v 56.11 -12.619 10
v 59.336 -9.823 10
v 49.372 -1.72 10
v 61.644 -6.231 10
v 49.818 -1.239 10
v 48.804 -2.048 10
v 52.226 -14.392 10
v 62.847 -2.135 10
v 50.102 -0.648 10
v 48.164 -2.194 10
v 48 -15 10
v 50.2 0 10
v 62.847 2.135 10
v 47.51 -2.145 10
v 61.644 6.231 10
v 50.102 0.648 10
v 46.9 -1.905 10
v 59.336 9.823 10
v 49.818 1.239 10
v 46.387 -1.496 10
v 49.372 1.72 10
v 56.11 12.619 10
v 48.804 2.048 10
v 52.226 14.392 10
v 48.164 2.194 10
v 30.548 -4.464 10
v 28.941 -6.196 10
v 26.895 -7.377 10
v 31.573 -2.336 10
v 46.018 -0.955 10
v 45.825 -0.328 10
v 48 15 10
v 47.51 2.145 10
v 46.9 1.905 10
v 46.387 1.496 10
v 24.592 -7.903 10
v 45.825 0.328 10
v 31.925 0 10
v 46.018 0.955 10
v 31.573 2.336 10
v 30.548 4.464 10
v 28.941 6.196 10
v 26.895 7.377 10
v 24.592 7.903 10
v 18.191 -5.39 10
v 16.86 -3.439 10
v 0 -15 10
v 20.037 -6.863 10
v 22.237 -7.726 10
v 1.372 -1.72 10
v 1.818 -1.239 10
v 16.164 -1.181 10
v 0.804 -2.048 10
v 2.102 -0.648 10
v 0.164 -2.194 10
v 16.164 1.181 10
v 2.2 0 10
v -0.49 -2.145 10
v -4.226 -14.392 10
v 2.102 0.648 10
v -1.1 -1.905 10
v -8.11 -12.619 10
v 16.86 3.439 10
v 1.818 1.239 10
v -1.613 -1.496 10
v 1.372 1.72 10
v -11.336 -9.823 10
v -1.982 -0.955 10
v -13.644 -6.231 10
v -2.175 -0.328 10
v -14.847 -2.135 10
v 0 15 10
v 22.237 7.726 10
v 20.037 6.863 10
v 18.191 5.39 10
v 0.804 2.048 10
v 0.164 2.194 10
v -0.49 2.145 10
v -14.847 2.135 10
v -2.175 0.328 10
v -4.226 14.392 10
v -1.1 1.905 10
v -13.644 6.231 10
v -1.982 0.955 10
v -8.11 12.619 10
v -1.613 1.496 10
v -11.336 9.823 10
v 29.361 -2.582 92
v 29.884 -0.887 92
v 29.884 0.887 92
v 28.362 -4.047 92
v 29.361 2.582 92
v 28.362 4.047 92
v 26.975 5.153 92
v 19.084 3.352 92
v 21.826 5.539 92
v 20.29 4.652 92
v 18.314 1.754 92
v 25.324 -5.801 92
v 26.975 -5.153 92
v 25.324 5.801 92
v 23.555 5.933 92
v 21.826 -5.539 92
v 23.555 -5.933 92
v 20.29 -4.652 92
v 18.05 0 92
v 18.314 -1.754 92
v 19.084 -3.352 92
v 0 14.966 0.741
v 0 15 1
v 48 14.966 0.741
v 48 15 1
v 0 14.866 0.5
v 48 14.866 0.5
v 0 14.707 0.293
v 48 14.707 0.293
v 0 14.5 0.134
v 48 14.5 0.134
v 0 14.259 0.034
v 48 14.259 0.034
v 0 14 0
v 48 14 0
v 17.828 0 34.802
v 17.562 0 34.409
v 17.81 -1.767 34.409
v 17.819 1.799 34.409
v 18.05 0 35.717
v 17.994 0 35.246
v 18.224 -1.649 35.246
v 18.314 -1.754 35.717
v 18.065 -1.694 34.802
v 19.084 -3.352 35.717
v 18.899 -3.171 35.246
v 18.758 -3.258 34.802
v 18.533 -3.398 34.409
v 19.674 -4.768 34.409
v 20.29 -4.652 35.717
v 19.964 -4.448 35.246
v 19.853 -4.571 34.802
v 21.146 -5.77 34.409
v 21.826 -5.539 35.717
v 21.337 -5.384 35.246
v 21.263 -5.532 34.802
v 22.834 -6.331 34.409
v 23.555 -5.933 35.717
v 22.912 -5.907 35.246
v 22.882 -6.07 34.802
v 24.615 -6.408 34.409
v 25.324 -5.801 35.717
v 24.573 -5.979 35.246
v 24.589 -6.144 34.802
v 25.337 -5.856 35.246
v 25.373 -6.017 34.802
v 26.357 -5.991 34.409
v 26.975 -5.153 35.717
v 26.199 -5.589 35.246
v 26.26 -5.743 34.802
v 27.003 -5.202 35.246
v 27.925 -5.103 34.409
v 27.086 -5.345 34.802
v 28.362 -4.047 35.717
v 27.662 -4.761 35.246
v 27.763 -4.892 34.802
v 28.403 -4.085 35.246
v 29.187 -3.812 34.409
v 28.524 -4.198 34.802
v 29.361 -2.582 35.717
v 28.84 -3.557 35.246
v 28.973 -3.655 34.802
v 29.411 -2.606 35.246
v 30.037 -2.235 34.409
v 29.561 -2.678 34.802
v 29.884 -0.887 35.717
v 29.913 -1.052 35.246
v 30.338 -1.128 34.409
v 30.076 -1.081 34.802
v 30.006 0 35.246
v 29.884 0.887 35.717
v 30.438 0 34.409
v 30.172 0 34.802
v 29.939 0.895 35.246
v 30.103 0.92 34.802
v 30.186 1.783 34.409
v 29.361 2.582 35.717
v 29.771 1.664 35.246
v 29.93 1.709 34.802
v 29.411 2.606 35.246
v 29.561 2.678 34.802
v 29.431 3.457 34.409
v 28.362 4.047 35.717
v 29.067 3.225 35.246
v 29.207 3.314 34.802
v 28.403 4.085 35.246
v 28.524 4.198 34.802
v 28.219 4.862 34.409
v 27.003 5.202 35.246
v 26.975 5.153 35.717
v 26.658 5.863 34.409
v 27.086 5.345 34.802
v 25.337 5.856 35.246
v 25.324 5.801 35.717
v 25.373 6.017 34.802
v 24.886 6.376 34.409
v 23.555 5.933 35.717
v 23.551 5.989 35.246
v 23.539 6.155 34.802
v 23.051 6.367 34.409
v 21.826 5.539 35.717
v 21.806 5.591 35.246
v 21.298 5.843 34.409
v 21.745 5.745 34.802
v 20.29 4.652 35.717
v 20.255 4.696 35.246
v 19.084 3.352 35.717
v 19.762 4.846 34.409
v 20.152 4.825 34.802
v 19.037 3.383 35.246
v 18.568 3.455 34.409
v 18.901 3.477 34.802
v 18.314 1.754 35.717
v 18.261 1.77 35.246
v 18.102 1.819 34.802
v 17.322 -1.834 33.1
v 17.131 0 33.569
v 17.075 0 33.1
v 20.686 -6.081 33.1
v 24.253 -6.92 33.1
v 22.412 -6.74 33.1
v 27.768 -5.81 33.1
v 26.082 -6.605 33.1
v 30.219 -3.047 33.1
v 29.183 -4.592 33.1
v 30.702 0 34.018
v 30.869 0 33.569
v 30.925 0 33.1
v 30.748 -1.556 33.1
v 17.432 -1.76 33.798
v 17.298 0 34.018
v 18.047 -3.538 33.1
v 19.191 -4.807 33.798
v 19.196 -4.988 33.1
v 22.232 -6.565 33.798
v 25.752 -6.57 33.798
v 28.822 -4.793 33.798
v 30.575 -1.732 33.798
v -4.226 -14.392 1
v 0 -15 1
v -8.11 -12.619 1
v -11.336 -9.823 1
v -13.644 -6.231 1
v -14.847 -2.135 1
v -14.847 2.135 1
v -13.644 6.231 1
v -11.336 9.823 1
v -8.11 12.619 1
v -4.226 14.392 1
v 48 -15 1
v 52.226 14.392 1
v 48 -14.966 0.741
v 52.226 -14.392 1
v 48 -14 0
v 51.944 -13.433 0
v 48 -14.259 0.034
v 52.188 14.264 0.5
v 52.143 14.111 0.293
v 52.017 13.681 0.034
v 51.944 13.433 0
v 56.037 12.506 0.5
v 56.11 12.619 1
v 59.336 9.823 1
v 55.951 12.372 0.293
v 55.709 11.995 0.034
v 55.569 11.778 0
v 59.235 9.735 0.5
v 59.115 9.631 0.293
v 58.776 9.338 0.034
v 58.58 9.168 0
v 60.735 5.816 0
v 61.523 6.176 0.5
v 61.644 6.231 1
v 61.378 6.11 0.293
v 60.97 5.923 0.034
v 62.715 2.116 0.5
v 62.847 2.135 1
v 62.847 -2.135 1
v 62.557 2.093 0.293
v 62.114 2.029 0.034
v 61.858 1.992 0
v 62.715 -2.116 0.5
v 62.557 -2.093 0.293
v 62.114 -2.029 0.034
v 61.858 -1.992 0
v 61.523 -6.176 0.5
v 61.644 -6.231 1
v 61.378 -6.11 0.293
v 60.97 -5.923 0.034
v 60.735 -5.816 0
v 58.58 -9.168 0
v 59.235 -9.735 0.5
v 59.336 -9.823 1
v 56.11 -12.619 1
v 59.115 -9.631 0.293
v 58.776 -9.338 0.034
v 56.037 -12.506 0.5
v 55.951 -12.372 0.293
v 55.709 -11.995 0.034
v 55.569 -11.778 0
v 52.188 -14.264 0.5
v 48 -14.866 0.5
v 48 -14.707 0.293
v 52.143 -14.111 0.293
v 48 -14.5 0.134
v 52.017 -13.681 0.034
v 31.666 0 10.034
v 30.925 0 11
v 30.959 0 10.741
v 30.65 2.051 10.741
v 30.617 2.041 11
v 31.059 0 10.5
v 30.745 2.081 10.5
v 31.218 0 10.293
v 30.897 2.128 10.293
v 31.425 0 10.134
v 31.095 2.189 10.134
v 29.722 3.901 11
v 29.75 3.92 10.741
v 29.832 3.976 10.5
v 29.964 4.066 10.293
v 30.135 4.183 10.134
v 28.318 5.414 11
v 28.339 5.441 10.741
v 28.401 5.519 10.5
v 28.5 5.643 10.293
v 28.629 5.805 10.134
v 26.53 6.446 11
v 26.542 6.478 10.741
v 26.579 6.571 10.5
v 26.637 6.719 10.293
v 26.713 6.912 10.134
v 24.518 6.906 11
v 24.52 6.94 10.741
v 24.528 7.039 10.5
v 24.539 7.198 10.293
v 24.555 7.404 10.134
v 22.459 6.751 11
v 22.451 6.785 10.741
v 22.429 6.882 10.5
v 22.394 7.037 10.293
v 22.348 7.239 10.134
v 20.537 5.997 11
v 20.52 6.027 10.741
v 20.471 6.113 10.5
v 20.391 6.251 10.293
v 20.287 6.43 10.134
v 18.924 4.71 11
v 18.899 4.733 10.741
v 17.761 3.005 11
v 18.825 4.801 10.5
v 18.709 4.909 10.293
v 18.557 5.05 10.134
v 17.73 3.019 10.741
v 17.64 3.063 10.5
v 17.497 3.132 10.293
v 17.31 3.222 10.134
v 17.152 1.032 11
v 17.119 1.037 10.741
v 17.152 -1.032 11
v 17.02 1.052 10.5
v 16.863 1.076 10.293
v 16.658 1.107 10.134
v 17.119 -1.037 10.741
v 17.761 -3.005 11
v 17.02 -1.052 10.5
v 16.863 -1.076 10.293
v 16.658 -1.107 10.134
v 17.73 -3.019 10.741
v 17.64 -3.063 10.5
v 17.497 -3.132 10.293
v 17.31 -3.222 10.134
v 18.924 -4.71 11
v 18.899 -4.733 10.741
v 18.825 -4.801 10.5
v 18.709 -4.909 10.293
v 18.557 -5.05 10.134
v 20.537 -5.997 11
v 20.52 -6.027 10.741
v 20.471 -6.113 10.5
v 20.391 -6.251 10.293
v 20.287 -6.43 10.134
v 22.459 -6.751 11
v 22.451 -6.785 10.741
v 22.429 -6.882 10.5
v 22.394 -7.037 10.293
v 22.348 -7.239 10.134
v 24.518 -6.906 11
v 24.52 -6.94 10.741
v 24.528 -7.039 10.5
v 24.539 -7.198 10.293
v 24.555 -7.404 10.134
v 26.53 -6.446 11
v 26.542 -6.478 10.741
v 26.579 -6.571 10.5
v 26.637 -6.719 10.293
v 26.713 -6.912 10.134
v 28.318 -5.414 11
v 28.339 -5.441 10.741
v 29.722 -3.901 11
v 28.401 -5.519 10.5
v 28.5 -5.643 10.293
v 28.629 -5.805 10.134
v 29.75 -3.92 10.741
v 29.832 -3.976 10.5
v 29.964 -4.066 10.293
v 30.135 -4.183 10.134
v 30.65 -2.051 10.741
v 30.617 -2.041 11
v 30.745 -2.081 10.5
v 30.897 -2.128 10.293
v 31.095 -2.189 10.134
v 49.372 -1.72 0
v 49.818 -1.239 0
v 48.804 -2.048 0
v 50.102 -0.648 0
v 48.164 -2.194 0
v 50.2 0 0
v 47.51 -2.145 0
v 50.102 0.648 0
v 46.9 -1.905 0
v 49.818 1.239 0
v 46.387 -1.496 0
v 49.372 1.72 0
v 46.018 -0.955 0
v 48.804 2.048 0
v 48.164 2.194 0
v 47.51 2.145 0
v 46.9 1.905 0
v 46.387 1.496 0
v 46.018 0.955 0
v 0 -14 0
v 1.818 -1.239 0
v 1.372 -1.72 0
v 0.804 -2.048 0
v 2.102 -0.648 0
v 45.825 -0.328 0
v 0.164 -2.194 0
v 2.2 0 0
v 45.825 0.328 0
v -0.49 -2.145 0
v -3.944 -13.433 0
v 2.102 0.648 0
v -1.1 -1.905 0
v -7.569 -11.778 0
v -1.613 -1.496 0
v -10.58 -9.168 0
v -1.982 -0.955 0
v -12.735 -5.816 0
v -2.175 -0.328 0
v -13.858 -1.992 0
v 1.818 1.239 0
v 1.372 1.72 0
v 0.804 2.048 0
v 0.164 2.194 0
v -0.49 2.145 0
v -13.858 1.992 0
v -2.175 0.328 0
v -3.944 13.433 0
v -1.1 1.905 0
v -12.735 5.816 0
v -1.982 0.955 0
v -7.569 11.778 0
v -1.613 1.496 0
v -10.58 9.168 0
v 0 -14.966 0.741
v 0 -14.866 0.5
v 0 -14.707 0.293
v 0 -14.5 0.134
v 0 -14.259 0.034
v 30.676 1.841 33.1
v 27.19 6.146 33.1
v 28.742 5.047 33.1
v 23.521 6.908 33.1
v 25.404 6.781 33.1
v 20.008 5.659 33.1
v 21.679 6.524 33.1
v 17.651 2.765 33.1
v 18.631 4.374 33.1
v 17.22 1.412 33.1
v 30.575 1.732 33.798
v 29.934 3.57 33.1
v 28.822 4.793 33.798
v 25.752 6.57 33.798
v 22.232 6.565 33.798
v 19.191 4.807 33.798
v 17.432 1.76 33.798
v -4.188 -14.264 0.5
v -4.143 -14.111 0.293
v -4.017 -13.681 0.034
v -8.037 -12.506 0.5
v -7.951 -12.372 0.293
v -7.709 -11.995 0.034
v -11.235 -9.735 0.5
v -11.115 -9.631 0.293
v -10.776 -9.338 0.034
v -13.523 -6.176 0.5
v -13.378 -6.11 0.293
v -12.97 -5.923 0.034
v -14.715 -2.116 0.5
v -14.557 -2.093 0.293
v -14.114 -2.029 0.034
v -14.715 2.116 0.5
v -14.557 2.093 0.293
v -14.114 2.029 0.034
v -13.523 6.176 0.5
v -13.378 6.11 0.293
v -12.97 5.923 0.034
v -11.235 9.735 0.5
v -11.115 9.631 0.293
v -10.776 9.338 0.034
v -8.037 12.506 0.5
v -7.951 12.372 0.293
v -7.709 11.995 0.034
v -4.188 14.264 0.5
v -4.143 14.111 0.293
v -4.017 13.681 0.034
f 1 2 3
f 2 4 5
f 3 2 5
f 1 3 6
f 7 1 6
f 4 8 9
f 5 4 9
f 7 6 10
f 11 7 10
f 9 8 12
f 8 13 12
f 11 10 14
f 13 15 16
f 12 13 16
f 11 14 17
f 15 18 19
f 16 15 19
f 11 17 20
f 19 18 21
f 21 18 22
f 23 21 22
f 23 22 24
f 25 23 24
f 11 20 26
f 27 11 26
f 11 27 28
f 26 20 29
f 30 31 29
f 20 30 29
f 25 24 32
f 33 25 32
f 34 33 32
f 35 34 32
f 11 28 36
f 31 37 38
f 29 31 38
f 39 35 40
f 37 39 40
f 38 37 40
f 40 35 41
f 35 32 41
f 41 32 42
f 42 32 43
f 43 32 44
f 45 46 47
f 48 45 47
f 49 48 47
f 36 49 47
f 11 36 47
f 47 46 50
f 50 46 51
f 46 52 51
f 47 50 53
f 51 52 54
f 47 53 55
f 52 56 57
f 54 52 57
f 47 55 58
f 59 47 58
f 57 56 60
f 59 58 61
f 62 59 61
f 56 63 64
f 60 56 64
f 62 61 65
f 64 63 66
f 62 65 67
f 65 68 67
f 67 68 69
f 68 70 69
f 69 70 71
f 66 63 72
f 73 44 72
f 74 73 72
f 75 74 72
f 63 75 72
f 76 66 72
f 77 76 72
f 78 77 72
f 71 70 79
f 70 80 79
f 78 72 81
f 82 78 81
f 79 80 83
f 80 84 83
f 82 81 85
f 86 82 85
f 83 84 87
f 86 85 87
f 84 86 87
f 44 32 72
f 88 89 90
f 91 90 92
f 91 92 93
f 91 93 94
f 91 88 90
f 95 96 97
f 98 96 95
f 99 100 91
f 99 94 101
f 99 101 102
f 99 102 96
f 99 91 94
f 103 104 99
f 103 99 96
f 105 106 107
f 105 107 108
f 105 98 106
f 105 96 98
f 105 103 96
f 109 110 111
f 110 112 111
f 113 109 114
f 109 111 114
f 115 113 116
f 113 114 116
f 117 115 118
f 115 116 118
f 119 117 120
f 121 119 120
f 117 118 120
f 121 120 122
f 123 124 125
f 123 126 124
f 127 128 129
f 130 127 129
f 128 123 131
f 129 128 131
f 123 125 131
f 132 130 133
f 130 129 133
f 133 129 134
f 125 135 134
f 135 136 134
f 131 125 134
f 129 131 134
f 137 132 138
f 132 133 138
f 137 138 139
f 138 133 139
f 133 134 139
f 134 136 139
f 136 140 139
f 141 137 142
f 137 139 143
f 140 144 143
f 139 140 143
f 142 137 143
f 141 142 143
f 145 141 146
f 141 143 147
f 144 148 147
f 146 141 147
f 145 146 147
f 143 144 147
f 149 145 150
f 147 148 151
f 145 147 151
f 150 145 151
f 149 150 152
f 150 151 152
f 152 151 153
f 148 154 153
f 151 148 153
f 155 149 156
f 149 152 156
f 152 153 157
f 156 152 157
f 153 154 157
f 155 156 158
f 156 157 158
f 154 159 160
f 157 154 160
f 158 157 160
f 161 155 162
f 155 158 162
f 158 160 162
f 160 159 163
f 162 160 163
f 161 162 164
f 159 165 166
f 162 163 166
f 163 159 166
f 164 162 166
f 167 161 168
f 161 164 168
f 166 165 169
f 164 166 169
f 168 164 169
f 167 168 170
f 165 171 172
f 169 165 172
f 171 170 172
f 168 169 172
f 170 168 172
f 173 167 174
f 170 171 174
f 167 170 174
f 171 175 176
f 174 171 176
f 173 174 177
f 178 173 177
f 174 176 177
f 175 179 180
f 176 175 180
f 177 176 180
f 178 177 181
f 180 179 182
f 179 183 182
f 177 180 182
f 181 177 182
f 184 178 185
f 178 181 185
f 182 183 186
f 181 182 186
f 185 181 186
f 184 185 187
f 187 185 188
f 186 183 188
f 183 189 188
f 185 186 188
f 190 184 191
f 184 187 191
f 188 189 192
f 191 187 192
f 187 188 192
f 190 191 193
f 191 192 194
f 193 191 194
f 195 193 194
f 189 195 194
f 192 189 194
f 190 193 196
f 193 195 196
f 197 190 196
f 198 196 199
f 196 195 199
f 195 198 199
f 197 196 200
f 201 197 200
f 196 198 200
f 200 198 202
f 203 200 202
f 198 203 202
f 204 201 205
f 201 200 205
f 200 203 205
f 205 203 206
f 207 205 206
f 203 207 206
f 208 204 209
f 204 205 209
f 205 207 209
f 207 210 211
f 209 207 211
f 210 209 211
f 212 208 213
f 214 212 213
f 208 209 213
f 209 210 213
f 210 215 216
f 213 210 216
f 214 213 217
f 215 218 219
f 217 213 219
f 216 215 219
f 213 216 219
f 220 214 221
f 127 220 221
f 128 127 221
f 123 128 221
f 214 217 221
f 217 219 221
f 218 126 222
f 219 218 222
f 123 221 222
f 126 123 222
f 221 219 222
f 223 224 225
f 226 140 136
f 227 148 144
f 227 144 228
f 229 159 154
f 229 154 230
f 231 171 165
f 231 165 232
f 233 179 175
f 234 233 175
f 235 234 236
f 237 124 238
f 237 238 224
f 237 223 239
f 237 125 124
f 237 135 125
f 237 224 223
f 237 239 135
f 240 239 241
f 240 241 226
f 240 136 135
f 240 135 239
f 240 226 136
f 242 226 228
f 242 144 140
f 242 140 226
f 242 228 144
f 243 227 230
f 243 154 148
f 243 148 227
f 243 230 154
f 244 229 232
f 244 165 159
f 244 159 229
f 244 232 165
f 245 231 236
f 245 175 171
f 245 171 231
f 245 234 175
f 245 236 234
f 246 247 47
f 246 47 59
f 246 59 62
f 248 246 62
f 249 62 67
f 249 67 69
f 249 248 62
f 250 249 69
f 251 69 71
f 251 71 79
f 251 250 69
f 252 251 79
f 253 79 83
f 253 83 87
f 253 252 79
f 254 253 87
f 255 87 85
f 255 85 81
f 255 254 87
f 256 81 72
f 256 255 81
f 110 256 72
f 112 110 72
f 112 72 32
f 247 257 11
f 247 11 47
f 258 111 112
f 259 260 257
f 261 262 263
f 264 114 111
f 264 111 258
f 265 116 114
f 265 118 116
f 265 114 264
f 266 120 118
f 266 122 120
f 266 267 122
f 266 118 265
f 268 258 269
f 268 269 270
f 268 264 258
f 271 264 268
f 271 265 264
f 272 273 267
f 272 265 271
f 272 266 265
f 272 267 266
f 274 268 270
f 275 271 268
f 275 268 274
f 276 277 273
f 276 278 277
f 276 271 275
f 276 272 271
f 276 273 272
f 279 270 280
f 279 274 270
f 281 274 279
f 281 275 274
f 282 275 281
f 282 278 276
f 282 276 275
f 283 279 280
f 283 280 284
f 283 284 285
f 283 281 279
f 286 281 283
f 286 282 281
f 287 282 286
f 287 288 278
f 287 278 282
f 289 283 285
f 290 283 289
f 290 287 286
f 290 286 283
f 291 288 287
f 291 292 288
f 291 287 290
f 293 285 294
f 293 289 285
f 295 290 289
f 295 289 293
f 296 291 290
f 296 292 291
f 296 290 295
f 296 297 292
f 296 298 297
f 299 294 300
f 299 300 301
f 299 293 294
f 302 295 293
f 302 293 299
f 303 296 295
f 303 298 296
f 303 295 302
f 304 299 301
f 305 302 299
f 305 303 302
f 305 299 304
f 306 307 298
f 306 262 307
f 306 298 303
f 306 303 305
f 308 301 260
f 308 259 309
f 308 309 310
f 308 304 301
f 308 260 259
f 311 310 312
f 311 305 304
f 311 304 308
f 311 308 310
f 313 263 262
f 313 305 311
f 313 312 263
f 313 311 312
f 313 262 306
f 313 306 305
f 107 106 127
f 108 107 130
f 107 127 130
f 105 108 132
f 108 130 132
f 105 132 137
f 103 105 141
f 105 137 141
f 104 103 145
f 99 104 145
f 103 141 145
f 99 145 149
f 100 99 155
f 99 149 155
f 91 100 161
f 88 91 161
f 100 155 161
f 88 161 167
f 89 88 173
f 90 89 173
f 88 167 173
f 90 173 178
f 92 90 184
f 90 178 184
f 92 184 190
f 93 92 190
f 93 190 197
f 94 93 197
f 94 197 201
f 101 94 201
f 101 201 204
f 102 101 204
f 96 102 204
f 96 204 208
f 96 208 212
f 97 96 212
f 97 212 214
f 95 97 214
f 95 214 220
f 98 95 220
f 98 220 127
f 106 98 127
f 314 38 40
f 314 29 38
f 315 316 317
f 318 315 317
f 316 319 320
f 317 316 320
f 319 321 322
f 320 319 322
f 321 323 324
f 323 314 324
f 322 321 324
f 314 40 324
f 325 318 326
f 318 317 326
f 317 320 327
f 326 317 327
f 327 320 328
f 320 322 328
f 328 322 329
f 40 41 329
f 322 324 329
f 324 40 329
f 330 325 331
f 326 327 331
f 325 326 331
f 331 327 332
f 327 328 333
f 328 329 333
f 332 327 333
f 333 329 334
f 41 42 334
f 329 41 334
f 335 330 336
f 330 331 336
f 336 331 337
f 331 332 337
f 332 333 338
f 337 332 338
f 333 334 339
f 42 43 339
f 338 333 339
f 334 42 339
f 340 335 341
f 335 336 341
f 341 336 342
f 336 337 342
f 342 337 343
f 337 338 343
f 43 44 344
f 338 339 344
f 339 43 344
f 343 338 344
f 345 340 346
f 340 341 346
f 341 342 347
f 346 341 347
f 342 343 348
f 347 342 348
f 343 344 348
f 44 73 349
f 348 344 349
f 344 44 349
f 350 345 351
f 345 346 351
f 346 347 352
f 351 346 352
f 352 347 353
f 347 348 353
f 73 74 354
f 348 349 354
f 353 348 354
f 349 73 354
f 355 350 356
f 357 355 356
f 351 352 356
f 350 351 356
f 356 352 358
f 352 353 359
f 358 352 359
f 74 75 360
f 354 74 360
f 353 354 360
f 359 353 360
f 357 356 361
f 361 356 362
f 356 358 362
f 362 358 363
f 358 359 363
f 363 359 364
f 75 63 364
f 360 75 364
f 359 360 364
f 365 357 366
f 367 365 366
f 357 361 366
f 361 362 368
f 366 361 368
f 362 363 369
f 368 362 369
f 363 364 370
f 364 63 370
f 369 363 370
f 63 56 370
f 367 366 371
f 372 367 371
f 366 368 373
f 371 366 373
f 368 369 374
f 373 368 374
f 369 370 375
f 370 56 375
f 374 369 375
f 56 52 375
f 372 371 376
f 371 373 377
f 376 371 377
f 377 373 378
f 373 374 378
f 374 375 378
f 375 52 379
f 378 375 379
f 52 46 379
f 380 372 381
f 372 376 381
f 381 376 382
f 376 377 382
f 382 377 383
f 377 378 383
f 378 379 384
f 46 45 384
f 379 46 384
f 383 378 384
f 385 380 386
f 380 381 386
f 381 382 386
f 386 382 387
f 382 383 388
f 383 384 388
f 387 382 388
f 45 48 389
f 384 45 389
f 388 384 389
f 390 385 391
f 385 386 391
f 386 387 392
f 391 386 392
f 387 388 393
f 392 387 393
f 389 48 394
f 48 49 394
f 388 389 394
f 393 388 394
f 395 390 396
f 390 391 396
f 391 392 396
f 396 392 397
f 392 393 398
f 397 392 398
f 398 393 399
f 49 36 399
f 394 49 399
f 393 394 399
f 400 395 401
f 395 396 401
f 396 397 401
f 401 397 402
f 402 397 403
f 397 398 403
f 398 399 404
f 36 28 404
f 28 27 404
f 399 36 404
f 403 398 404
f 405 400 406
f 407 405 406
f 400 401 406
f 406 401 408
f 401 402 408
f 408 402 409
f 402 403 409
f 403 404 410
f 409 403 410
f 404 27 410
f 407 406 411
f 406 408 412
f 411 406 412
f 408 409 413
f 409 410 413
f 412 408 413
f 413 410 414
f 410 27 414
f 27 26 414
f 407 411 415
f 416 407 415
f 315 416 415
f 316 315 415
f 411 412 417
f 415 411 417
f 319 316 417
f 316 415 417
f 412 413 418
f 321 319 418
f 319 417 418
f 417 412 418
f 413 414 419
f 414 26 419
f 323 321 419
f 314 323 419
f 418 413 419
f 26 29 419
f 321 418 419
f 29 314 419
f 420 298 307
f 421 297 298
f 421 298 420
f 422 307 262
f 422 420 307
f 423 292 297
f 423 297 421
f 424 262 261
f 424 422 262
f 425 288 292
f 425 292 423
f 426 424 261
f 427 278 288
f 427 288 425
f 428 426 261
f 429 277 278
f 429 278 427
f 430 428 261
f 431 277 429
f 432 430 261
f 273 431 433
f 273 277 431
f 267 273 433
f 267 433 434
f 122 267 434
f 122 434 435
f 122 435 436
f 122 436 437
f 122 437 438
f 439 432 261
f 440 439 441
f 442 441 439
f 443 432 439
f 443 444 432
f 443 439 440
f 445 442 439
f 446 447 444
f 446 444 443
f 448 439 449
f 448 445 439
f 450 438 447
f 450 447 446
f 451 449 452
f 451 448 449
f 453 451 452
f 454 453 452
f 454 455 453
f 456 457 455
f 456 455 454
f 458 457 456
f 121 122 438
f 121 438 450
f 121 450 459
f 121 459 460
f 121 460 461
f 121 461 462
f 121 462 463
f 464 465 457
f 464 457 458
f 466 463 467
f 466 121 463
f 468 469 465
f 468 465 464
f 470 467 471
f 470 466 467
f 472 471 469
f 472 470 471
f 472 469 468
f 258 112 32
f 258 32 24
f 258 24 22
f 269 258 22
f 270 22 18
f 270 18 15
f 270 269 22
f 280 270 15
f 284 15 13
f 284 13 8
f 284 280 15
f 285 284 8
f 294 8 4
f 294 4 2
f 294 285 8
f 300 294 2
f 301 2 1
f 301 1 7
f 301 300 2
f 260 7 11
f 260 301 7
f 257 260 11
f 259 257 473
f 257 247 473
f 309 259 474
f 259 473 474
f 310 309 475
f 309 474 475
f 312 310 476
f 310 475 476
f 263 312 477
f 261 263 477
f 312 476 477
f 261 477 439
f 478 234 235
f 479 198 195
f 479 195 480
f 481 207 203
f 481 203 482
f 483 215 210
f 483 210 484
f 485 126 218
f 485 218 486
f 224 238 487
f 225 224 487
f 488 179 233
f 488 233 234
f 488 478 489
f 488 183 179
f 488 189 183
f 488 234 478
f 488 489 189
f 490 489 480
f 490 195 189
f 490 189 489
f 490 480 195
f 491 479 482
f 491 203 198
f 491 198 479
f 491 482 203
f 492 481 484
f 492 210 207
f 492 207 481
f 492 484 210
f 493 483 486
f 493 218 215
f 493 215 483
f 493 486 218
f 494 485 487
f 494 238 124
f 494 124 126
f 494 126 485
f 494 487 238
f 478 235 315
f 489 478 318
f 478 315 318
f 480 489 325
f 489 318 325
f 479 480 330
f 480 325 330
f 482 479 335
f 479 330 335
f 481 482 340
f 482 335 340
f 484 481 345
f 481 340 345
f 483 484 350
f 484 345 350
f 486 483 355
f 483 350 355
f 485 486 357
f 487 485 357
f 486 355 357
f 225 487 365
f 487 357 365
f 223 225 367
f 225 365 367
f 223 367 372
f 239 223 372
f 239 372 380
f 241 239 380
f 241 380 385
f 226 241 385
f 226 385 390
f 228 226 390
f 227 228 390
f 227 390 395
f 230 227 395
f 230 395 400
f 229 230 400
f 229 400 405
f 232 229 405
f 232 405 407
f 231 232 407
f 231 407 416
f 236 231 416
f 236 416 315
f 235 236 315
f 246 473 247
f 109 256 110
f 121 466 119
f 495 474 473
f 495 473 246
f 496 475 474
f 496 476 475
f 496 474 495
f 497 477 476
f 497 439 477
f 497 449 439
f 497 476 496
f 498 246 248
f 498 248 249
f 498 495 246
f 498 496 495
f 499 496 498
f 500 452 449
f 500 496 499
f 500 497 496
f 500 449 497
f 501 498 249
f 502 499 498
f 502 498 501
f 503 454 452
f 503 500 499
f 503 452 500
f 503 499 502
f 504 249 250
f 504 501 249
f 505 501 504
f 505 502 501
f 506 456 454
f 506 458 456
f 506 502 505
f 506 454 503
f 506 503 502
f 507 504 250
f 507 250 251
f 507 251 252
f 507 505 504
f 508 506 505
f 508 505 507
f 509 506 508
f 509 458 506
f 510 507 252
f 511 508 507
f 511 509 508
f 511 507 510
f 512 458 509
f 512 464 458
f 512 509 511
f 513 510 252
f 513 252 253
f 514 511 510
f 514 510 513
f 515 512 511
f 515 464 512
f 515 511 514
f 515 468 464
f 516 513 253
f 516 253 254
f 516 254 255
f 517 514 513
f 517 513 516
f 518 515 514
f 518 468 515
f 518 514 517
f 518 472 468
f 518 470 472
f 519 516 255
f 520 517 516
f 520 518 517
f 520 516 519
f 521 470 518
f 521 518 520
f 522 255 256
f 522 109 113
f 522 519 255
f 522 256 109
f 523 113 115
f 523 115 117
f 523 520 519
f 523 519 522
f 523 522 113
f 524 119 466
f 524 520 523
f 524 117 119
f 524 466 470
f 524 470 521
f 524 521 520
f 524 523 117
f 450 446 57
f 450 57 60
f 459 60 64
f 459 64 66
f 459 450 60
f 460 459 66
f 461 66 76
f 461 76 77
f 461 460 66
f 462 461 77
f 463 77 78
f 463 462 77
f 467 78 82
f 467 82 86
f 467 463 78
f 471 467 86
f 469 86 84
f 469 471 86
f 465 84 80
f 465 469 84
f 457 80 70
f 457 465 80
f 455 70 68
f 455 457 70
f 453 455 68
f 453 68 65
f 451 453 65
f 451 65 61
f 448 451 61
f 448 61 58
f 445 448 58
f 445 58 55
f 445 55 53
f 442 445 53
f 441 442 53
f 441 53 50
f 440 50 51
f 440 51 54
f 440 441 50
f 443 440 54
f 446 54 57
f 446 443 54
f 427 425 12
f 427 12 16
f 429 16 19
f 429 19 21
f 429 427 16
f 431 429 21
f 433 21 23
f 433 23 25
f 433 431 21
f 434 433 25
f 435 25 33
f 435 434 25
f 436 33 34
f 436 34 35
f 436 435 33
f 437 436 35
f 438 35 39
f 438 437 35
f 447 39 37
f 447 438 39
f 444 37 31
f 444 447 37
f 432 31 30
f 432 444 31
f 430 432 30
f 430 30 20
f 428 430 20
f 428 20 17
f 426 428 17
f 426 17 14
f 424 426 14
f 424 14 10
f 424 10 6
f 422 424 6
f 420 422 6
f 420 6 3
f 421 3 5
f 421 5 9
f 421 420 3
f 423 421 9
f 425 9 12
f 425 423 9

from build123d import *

# Parameters (mm, degrees)
SKETCH1_R           = 2.2
BOSS_EXTRUDE1_DEPTH = 10
SKETCH2_R           = 6.925
BOSS_EXTRUDE2_DEPTH = 24
SKETCH3_R           = 5.95
BOSS_EXTRUDE3_DEPTH = 58
FILLET1_R           = 2
FILLET2_R           = 2
FILLET3_R           = 1
FILLET4_R           = 1


with BuildPart() as part:
    # Sketch1 → Boss-Extrude1 (new body)
    with BuildSketch(Plane.XY):
        with BuildLine():
            Line((0, 15), (48, 15))
            ThreePointArc((48, 15), (63, 0), (48, -15))
            Line((48, -15), (0, -15))
            ThreePointArc((0, -15), (-15, 0), (0, 15))
        make_face()
        Circle(SKETCH1_R, mode=Mode.SUBTRACT)
        with Locations((48, 0)):
            Circle(SKETCH1_R, mode=Mode.SUBTRACT)
    extrude(amount=BOSS_EXTRUDE1_DEPTH)

    # Sketch2 → Boss-Extrude2 (add)
    with BuildSketch(Plane.XY.offset(10)):
        with Locations((24, 0)):
            Circle(SKETCH2_R)
    extrude(amount=BOSS_EXTRUDE2_DEPTH)

    # Sketch3 → Boss-Extrude3 (add)
    with BuildSketch(Plane.XY.offset(34)):
        with Locations(Location((24, 0, 0), (0, 0, 180))):
            Circle(SKETCH3_R)
    extrude(amount=BOSS_EXTRUDE3_DEPTH)

    # Fillet1
    # the kernel refuses this fillet: 2 mm, written as the material it adds along each edge
    with BuildSketch(Plane(origin=(24, 0, 34), x_dir=(-1, 0, 0), z_dir=(0, 1, 0))) as fillet1_piece_1:
        with BuildLine():
            CenterArc((7.95, 1.71737445), FILLET1_R, 180, 59.169502568)
            Line((5.95, 1.71737445), (5.91, 1.71737445))
            Line((5.91, 1.71737445), (5.91, 0))
            Line((5.91, 0), (5.95, -0.04))
            ThreePointArc((5.95, -0.04), (6.4375, -0.04), (6.9045, -0.034347489))
            Line((6.9045, -0.034347489), (6.925, 0))
        make_face()
    revolve(axis=Axis((24, 0, 34), (0, 0, 1)))

    # Fillet2
    fillet2_edges = [part.edges().sort_by_distance(p)[0] for p in [
        (24, -6.925, 34),
    ]]
    fillet(fillet2_edges, radius=FILLET2_R)

    # Fillet3
    fillet3_edges = [part.edges().sort_by_distance(p)[0] for p in [
        (17.075, 0, 10),
    ]]
    fillet(fillet3_edges, radius=FILLET3_R)

    # Fillet4
    fillet4_edges = [part.edges().sort_by_distance(p)[0] for p in [
        (24, 15, 0),
        (63, 0, 0),
        (24, -15, 0),
        (-15, 0, 0),
    ]]
    fillet(fillet4_edges, radius=FILLET4_R)


solid = part.part
